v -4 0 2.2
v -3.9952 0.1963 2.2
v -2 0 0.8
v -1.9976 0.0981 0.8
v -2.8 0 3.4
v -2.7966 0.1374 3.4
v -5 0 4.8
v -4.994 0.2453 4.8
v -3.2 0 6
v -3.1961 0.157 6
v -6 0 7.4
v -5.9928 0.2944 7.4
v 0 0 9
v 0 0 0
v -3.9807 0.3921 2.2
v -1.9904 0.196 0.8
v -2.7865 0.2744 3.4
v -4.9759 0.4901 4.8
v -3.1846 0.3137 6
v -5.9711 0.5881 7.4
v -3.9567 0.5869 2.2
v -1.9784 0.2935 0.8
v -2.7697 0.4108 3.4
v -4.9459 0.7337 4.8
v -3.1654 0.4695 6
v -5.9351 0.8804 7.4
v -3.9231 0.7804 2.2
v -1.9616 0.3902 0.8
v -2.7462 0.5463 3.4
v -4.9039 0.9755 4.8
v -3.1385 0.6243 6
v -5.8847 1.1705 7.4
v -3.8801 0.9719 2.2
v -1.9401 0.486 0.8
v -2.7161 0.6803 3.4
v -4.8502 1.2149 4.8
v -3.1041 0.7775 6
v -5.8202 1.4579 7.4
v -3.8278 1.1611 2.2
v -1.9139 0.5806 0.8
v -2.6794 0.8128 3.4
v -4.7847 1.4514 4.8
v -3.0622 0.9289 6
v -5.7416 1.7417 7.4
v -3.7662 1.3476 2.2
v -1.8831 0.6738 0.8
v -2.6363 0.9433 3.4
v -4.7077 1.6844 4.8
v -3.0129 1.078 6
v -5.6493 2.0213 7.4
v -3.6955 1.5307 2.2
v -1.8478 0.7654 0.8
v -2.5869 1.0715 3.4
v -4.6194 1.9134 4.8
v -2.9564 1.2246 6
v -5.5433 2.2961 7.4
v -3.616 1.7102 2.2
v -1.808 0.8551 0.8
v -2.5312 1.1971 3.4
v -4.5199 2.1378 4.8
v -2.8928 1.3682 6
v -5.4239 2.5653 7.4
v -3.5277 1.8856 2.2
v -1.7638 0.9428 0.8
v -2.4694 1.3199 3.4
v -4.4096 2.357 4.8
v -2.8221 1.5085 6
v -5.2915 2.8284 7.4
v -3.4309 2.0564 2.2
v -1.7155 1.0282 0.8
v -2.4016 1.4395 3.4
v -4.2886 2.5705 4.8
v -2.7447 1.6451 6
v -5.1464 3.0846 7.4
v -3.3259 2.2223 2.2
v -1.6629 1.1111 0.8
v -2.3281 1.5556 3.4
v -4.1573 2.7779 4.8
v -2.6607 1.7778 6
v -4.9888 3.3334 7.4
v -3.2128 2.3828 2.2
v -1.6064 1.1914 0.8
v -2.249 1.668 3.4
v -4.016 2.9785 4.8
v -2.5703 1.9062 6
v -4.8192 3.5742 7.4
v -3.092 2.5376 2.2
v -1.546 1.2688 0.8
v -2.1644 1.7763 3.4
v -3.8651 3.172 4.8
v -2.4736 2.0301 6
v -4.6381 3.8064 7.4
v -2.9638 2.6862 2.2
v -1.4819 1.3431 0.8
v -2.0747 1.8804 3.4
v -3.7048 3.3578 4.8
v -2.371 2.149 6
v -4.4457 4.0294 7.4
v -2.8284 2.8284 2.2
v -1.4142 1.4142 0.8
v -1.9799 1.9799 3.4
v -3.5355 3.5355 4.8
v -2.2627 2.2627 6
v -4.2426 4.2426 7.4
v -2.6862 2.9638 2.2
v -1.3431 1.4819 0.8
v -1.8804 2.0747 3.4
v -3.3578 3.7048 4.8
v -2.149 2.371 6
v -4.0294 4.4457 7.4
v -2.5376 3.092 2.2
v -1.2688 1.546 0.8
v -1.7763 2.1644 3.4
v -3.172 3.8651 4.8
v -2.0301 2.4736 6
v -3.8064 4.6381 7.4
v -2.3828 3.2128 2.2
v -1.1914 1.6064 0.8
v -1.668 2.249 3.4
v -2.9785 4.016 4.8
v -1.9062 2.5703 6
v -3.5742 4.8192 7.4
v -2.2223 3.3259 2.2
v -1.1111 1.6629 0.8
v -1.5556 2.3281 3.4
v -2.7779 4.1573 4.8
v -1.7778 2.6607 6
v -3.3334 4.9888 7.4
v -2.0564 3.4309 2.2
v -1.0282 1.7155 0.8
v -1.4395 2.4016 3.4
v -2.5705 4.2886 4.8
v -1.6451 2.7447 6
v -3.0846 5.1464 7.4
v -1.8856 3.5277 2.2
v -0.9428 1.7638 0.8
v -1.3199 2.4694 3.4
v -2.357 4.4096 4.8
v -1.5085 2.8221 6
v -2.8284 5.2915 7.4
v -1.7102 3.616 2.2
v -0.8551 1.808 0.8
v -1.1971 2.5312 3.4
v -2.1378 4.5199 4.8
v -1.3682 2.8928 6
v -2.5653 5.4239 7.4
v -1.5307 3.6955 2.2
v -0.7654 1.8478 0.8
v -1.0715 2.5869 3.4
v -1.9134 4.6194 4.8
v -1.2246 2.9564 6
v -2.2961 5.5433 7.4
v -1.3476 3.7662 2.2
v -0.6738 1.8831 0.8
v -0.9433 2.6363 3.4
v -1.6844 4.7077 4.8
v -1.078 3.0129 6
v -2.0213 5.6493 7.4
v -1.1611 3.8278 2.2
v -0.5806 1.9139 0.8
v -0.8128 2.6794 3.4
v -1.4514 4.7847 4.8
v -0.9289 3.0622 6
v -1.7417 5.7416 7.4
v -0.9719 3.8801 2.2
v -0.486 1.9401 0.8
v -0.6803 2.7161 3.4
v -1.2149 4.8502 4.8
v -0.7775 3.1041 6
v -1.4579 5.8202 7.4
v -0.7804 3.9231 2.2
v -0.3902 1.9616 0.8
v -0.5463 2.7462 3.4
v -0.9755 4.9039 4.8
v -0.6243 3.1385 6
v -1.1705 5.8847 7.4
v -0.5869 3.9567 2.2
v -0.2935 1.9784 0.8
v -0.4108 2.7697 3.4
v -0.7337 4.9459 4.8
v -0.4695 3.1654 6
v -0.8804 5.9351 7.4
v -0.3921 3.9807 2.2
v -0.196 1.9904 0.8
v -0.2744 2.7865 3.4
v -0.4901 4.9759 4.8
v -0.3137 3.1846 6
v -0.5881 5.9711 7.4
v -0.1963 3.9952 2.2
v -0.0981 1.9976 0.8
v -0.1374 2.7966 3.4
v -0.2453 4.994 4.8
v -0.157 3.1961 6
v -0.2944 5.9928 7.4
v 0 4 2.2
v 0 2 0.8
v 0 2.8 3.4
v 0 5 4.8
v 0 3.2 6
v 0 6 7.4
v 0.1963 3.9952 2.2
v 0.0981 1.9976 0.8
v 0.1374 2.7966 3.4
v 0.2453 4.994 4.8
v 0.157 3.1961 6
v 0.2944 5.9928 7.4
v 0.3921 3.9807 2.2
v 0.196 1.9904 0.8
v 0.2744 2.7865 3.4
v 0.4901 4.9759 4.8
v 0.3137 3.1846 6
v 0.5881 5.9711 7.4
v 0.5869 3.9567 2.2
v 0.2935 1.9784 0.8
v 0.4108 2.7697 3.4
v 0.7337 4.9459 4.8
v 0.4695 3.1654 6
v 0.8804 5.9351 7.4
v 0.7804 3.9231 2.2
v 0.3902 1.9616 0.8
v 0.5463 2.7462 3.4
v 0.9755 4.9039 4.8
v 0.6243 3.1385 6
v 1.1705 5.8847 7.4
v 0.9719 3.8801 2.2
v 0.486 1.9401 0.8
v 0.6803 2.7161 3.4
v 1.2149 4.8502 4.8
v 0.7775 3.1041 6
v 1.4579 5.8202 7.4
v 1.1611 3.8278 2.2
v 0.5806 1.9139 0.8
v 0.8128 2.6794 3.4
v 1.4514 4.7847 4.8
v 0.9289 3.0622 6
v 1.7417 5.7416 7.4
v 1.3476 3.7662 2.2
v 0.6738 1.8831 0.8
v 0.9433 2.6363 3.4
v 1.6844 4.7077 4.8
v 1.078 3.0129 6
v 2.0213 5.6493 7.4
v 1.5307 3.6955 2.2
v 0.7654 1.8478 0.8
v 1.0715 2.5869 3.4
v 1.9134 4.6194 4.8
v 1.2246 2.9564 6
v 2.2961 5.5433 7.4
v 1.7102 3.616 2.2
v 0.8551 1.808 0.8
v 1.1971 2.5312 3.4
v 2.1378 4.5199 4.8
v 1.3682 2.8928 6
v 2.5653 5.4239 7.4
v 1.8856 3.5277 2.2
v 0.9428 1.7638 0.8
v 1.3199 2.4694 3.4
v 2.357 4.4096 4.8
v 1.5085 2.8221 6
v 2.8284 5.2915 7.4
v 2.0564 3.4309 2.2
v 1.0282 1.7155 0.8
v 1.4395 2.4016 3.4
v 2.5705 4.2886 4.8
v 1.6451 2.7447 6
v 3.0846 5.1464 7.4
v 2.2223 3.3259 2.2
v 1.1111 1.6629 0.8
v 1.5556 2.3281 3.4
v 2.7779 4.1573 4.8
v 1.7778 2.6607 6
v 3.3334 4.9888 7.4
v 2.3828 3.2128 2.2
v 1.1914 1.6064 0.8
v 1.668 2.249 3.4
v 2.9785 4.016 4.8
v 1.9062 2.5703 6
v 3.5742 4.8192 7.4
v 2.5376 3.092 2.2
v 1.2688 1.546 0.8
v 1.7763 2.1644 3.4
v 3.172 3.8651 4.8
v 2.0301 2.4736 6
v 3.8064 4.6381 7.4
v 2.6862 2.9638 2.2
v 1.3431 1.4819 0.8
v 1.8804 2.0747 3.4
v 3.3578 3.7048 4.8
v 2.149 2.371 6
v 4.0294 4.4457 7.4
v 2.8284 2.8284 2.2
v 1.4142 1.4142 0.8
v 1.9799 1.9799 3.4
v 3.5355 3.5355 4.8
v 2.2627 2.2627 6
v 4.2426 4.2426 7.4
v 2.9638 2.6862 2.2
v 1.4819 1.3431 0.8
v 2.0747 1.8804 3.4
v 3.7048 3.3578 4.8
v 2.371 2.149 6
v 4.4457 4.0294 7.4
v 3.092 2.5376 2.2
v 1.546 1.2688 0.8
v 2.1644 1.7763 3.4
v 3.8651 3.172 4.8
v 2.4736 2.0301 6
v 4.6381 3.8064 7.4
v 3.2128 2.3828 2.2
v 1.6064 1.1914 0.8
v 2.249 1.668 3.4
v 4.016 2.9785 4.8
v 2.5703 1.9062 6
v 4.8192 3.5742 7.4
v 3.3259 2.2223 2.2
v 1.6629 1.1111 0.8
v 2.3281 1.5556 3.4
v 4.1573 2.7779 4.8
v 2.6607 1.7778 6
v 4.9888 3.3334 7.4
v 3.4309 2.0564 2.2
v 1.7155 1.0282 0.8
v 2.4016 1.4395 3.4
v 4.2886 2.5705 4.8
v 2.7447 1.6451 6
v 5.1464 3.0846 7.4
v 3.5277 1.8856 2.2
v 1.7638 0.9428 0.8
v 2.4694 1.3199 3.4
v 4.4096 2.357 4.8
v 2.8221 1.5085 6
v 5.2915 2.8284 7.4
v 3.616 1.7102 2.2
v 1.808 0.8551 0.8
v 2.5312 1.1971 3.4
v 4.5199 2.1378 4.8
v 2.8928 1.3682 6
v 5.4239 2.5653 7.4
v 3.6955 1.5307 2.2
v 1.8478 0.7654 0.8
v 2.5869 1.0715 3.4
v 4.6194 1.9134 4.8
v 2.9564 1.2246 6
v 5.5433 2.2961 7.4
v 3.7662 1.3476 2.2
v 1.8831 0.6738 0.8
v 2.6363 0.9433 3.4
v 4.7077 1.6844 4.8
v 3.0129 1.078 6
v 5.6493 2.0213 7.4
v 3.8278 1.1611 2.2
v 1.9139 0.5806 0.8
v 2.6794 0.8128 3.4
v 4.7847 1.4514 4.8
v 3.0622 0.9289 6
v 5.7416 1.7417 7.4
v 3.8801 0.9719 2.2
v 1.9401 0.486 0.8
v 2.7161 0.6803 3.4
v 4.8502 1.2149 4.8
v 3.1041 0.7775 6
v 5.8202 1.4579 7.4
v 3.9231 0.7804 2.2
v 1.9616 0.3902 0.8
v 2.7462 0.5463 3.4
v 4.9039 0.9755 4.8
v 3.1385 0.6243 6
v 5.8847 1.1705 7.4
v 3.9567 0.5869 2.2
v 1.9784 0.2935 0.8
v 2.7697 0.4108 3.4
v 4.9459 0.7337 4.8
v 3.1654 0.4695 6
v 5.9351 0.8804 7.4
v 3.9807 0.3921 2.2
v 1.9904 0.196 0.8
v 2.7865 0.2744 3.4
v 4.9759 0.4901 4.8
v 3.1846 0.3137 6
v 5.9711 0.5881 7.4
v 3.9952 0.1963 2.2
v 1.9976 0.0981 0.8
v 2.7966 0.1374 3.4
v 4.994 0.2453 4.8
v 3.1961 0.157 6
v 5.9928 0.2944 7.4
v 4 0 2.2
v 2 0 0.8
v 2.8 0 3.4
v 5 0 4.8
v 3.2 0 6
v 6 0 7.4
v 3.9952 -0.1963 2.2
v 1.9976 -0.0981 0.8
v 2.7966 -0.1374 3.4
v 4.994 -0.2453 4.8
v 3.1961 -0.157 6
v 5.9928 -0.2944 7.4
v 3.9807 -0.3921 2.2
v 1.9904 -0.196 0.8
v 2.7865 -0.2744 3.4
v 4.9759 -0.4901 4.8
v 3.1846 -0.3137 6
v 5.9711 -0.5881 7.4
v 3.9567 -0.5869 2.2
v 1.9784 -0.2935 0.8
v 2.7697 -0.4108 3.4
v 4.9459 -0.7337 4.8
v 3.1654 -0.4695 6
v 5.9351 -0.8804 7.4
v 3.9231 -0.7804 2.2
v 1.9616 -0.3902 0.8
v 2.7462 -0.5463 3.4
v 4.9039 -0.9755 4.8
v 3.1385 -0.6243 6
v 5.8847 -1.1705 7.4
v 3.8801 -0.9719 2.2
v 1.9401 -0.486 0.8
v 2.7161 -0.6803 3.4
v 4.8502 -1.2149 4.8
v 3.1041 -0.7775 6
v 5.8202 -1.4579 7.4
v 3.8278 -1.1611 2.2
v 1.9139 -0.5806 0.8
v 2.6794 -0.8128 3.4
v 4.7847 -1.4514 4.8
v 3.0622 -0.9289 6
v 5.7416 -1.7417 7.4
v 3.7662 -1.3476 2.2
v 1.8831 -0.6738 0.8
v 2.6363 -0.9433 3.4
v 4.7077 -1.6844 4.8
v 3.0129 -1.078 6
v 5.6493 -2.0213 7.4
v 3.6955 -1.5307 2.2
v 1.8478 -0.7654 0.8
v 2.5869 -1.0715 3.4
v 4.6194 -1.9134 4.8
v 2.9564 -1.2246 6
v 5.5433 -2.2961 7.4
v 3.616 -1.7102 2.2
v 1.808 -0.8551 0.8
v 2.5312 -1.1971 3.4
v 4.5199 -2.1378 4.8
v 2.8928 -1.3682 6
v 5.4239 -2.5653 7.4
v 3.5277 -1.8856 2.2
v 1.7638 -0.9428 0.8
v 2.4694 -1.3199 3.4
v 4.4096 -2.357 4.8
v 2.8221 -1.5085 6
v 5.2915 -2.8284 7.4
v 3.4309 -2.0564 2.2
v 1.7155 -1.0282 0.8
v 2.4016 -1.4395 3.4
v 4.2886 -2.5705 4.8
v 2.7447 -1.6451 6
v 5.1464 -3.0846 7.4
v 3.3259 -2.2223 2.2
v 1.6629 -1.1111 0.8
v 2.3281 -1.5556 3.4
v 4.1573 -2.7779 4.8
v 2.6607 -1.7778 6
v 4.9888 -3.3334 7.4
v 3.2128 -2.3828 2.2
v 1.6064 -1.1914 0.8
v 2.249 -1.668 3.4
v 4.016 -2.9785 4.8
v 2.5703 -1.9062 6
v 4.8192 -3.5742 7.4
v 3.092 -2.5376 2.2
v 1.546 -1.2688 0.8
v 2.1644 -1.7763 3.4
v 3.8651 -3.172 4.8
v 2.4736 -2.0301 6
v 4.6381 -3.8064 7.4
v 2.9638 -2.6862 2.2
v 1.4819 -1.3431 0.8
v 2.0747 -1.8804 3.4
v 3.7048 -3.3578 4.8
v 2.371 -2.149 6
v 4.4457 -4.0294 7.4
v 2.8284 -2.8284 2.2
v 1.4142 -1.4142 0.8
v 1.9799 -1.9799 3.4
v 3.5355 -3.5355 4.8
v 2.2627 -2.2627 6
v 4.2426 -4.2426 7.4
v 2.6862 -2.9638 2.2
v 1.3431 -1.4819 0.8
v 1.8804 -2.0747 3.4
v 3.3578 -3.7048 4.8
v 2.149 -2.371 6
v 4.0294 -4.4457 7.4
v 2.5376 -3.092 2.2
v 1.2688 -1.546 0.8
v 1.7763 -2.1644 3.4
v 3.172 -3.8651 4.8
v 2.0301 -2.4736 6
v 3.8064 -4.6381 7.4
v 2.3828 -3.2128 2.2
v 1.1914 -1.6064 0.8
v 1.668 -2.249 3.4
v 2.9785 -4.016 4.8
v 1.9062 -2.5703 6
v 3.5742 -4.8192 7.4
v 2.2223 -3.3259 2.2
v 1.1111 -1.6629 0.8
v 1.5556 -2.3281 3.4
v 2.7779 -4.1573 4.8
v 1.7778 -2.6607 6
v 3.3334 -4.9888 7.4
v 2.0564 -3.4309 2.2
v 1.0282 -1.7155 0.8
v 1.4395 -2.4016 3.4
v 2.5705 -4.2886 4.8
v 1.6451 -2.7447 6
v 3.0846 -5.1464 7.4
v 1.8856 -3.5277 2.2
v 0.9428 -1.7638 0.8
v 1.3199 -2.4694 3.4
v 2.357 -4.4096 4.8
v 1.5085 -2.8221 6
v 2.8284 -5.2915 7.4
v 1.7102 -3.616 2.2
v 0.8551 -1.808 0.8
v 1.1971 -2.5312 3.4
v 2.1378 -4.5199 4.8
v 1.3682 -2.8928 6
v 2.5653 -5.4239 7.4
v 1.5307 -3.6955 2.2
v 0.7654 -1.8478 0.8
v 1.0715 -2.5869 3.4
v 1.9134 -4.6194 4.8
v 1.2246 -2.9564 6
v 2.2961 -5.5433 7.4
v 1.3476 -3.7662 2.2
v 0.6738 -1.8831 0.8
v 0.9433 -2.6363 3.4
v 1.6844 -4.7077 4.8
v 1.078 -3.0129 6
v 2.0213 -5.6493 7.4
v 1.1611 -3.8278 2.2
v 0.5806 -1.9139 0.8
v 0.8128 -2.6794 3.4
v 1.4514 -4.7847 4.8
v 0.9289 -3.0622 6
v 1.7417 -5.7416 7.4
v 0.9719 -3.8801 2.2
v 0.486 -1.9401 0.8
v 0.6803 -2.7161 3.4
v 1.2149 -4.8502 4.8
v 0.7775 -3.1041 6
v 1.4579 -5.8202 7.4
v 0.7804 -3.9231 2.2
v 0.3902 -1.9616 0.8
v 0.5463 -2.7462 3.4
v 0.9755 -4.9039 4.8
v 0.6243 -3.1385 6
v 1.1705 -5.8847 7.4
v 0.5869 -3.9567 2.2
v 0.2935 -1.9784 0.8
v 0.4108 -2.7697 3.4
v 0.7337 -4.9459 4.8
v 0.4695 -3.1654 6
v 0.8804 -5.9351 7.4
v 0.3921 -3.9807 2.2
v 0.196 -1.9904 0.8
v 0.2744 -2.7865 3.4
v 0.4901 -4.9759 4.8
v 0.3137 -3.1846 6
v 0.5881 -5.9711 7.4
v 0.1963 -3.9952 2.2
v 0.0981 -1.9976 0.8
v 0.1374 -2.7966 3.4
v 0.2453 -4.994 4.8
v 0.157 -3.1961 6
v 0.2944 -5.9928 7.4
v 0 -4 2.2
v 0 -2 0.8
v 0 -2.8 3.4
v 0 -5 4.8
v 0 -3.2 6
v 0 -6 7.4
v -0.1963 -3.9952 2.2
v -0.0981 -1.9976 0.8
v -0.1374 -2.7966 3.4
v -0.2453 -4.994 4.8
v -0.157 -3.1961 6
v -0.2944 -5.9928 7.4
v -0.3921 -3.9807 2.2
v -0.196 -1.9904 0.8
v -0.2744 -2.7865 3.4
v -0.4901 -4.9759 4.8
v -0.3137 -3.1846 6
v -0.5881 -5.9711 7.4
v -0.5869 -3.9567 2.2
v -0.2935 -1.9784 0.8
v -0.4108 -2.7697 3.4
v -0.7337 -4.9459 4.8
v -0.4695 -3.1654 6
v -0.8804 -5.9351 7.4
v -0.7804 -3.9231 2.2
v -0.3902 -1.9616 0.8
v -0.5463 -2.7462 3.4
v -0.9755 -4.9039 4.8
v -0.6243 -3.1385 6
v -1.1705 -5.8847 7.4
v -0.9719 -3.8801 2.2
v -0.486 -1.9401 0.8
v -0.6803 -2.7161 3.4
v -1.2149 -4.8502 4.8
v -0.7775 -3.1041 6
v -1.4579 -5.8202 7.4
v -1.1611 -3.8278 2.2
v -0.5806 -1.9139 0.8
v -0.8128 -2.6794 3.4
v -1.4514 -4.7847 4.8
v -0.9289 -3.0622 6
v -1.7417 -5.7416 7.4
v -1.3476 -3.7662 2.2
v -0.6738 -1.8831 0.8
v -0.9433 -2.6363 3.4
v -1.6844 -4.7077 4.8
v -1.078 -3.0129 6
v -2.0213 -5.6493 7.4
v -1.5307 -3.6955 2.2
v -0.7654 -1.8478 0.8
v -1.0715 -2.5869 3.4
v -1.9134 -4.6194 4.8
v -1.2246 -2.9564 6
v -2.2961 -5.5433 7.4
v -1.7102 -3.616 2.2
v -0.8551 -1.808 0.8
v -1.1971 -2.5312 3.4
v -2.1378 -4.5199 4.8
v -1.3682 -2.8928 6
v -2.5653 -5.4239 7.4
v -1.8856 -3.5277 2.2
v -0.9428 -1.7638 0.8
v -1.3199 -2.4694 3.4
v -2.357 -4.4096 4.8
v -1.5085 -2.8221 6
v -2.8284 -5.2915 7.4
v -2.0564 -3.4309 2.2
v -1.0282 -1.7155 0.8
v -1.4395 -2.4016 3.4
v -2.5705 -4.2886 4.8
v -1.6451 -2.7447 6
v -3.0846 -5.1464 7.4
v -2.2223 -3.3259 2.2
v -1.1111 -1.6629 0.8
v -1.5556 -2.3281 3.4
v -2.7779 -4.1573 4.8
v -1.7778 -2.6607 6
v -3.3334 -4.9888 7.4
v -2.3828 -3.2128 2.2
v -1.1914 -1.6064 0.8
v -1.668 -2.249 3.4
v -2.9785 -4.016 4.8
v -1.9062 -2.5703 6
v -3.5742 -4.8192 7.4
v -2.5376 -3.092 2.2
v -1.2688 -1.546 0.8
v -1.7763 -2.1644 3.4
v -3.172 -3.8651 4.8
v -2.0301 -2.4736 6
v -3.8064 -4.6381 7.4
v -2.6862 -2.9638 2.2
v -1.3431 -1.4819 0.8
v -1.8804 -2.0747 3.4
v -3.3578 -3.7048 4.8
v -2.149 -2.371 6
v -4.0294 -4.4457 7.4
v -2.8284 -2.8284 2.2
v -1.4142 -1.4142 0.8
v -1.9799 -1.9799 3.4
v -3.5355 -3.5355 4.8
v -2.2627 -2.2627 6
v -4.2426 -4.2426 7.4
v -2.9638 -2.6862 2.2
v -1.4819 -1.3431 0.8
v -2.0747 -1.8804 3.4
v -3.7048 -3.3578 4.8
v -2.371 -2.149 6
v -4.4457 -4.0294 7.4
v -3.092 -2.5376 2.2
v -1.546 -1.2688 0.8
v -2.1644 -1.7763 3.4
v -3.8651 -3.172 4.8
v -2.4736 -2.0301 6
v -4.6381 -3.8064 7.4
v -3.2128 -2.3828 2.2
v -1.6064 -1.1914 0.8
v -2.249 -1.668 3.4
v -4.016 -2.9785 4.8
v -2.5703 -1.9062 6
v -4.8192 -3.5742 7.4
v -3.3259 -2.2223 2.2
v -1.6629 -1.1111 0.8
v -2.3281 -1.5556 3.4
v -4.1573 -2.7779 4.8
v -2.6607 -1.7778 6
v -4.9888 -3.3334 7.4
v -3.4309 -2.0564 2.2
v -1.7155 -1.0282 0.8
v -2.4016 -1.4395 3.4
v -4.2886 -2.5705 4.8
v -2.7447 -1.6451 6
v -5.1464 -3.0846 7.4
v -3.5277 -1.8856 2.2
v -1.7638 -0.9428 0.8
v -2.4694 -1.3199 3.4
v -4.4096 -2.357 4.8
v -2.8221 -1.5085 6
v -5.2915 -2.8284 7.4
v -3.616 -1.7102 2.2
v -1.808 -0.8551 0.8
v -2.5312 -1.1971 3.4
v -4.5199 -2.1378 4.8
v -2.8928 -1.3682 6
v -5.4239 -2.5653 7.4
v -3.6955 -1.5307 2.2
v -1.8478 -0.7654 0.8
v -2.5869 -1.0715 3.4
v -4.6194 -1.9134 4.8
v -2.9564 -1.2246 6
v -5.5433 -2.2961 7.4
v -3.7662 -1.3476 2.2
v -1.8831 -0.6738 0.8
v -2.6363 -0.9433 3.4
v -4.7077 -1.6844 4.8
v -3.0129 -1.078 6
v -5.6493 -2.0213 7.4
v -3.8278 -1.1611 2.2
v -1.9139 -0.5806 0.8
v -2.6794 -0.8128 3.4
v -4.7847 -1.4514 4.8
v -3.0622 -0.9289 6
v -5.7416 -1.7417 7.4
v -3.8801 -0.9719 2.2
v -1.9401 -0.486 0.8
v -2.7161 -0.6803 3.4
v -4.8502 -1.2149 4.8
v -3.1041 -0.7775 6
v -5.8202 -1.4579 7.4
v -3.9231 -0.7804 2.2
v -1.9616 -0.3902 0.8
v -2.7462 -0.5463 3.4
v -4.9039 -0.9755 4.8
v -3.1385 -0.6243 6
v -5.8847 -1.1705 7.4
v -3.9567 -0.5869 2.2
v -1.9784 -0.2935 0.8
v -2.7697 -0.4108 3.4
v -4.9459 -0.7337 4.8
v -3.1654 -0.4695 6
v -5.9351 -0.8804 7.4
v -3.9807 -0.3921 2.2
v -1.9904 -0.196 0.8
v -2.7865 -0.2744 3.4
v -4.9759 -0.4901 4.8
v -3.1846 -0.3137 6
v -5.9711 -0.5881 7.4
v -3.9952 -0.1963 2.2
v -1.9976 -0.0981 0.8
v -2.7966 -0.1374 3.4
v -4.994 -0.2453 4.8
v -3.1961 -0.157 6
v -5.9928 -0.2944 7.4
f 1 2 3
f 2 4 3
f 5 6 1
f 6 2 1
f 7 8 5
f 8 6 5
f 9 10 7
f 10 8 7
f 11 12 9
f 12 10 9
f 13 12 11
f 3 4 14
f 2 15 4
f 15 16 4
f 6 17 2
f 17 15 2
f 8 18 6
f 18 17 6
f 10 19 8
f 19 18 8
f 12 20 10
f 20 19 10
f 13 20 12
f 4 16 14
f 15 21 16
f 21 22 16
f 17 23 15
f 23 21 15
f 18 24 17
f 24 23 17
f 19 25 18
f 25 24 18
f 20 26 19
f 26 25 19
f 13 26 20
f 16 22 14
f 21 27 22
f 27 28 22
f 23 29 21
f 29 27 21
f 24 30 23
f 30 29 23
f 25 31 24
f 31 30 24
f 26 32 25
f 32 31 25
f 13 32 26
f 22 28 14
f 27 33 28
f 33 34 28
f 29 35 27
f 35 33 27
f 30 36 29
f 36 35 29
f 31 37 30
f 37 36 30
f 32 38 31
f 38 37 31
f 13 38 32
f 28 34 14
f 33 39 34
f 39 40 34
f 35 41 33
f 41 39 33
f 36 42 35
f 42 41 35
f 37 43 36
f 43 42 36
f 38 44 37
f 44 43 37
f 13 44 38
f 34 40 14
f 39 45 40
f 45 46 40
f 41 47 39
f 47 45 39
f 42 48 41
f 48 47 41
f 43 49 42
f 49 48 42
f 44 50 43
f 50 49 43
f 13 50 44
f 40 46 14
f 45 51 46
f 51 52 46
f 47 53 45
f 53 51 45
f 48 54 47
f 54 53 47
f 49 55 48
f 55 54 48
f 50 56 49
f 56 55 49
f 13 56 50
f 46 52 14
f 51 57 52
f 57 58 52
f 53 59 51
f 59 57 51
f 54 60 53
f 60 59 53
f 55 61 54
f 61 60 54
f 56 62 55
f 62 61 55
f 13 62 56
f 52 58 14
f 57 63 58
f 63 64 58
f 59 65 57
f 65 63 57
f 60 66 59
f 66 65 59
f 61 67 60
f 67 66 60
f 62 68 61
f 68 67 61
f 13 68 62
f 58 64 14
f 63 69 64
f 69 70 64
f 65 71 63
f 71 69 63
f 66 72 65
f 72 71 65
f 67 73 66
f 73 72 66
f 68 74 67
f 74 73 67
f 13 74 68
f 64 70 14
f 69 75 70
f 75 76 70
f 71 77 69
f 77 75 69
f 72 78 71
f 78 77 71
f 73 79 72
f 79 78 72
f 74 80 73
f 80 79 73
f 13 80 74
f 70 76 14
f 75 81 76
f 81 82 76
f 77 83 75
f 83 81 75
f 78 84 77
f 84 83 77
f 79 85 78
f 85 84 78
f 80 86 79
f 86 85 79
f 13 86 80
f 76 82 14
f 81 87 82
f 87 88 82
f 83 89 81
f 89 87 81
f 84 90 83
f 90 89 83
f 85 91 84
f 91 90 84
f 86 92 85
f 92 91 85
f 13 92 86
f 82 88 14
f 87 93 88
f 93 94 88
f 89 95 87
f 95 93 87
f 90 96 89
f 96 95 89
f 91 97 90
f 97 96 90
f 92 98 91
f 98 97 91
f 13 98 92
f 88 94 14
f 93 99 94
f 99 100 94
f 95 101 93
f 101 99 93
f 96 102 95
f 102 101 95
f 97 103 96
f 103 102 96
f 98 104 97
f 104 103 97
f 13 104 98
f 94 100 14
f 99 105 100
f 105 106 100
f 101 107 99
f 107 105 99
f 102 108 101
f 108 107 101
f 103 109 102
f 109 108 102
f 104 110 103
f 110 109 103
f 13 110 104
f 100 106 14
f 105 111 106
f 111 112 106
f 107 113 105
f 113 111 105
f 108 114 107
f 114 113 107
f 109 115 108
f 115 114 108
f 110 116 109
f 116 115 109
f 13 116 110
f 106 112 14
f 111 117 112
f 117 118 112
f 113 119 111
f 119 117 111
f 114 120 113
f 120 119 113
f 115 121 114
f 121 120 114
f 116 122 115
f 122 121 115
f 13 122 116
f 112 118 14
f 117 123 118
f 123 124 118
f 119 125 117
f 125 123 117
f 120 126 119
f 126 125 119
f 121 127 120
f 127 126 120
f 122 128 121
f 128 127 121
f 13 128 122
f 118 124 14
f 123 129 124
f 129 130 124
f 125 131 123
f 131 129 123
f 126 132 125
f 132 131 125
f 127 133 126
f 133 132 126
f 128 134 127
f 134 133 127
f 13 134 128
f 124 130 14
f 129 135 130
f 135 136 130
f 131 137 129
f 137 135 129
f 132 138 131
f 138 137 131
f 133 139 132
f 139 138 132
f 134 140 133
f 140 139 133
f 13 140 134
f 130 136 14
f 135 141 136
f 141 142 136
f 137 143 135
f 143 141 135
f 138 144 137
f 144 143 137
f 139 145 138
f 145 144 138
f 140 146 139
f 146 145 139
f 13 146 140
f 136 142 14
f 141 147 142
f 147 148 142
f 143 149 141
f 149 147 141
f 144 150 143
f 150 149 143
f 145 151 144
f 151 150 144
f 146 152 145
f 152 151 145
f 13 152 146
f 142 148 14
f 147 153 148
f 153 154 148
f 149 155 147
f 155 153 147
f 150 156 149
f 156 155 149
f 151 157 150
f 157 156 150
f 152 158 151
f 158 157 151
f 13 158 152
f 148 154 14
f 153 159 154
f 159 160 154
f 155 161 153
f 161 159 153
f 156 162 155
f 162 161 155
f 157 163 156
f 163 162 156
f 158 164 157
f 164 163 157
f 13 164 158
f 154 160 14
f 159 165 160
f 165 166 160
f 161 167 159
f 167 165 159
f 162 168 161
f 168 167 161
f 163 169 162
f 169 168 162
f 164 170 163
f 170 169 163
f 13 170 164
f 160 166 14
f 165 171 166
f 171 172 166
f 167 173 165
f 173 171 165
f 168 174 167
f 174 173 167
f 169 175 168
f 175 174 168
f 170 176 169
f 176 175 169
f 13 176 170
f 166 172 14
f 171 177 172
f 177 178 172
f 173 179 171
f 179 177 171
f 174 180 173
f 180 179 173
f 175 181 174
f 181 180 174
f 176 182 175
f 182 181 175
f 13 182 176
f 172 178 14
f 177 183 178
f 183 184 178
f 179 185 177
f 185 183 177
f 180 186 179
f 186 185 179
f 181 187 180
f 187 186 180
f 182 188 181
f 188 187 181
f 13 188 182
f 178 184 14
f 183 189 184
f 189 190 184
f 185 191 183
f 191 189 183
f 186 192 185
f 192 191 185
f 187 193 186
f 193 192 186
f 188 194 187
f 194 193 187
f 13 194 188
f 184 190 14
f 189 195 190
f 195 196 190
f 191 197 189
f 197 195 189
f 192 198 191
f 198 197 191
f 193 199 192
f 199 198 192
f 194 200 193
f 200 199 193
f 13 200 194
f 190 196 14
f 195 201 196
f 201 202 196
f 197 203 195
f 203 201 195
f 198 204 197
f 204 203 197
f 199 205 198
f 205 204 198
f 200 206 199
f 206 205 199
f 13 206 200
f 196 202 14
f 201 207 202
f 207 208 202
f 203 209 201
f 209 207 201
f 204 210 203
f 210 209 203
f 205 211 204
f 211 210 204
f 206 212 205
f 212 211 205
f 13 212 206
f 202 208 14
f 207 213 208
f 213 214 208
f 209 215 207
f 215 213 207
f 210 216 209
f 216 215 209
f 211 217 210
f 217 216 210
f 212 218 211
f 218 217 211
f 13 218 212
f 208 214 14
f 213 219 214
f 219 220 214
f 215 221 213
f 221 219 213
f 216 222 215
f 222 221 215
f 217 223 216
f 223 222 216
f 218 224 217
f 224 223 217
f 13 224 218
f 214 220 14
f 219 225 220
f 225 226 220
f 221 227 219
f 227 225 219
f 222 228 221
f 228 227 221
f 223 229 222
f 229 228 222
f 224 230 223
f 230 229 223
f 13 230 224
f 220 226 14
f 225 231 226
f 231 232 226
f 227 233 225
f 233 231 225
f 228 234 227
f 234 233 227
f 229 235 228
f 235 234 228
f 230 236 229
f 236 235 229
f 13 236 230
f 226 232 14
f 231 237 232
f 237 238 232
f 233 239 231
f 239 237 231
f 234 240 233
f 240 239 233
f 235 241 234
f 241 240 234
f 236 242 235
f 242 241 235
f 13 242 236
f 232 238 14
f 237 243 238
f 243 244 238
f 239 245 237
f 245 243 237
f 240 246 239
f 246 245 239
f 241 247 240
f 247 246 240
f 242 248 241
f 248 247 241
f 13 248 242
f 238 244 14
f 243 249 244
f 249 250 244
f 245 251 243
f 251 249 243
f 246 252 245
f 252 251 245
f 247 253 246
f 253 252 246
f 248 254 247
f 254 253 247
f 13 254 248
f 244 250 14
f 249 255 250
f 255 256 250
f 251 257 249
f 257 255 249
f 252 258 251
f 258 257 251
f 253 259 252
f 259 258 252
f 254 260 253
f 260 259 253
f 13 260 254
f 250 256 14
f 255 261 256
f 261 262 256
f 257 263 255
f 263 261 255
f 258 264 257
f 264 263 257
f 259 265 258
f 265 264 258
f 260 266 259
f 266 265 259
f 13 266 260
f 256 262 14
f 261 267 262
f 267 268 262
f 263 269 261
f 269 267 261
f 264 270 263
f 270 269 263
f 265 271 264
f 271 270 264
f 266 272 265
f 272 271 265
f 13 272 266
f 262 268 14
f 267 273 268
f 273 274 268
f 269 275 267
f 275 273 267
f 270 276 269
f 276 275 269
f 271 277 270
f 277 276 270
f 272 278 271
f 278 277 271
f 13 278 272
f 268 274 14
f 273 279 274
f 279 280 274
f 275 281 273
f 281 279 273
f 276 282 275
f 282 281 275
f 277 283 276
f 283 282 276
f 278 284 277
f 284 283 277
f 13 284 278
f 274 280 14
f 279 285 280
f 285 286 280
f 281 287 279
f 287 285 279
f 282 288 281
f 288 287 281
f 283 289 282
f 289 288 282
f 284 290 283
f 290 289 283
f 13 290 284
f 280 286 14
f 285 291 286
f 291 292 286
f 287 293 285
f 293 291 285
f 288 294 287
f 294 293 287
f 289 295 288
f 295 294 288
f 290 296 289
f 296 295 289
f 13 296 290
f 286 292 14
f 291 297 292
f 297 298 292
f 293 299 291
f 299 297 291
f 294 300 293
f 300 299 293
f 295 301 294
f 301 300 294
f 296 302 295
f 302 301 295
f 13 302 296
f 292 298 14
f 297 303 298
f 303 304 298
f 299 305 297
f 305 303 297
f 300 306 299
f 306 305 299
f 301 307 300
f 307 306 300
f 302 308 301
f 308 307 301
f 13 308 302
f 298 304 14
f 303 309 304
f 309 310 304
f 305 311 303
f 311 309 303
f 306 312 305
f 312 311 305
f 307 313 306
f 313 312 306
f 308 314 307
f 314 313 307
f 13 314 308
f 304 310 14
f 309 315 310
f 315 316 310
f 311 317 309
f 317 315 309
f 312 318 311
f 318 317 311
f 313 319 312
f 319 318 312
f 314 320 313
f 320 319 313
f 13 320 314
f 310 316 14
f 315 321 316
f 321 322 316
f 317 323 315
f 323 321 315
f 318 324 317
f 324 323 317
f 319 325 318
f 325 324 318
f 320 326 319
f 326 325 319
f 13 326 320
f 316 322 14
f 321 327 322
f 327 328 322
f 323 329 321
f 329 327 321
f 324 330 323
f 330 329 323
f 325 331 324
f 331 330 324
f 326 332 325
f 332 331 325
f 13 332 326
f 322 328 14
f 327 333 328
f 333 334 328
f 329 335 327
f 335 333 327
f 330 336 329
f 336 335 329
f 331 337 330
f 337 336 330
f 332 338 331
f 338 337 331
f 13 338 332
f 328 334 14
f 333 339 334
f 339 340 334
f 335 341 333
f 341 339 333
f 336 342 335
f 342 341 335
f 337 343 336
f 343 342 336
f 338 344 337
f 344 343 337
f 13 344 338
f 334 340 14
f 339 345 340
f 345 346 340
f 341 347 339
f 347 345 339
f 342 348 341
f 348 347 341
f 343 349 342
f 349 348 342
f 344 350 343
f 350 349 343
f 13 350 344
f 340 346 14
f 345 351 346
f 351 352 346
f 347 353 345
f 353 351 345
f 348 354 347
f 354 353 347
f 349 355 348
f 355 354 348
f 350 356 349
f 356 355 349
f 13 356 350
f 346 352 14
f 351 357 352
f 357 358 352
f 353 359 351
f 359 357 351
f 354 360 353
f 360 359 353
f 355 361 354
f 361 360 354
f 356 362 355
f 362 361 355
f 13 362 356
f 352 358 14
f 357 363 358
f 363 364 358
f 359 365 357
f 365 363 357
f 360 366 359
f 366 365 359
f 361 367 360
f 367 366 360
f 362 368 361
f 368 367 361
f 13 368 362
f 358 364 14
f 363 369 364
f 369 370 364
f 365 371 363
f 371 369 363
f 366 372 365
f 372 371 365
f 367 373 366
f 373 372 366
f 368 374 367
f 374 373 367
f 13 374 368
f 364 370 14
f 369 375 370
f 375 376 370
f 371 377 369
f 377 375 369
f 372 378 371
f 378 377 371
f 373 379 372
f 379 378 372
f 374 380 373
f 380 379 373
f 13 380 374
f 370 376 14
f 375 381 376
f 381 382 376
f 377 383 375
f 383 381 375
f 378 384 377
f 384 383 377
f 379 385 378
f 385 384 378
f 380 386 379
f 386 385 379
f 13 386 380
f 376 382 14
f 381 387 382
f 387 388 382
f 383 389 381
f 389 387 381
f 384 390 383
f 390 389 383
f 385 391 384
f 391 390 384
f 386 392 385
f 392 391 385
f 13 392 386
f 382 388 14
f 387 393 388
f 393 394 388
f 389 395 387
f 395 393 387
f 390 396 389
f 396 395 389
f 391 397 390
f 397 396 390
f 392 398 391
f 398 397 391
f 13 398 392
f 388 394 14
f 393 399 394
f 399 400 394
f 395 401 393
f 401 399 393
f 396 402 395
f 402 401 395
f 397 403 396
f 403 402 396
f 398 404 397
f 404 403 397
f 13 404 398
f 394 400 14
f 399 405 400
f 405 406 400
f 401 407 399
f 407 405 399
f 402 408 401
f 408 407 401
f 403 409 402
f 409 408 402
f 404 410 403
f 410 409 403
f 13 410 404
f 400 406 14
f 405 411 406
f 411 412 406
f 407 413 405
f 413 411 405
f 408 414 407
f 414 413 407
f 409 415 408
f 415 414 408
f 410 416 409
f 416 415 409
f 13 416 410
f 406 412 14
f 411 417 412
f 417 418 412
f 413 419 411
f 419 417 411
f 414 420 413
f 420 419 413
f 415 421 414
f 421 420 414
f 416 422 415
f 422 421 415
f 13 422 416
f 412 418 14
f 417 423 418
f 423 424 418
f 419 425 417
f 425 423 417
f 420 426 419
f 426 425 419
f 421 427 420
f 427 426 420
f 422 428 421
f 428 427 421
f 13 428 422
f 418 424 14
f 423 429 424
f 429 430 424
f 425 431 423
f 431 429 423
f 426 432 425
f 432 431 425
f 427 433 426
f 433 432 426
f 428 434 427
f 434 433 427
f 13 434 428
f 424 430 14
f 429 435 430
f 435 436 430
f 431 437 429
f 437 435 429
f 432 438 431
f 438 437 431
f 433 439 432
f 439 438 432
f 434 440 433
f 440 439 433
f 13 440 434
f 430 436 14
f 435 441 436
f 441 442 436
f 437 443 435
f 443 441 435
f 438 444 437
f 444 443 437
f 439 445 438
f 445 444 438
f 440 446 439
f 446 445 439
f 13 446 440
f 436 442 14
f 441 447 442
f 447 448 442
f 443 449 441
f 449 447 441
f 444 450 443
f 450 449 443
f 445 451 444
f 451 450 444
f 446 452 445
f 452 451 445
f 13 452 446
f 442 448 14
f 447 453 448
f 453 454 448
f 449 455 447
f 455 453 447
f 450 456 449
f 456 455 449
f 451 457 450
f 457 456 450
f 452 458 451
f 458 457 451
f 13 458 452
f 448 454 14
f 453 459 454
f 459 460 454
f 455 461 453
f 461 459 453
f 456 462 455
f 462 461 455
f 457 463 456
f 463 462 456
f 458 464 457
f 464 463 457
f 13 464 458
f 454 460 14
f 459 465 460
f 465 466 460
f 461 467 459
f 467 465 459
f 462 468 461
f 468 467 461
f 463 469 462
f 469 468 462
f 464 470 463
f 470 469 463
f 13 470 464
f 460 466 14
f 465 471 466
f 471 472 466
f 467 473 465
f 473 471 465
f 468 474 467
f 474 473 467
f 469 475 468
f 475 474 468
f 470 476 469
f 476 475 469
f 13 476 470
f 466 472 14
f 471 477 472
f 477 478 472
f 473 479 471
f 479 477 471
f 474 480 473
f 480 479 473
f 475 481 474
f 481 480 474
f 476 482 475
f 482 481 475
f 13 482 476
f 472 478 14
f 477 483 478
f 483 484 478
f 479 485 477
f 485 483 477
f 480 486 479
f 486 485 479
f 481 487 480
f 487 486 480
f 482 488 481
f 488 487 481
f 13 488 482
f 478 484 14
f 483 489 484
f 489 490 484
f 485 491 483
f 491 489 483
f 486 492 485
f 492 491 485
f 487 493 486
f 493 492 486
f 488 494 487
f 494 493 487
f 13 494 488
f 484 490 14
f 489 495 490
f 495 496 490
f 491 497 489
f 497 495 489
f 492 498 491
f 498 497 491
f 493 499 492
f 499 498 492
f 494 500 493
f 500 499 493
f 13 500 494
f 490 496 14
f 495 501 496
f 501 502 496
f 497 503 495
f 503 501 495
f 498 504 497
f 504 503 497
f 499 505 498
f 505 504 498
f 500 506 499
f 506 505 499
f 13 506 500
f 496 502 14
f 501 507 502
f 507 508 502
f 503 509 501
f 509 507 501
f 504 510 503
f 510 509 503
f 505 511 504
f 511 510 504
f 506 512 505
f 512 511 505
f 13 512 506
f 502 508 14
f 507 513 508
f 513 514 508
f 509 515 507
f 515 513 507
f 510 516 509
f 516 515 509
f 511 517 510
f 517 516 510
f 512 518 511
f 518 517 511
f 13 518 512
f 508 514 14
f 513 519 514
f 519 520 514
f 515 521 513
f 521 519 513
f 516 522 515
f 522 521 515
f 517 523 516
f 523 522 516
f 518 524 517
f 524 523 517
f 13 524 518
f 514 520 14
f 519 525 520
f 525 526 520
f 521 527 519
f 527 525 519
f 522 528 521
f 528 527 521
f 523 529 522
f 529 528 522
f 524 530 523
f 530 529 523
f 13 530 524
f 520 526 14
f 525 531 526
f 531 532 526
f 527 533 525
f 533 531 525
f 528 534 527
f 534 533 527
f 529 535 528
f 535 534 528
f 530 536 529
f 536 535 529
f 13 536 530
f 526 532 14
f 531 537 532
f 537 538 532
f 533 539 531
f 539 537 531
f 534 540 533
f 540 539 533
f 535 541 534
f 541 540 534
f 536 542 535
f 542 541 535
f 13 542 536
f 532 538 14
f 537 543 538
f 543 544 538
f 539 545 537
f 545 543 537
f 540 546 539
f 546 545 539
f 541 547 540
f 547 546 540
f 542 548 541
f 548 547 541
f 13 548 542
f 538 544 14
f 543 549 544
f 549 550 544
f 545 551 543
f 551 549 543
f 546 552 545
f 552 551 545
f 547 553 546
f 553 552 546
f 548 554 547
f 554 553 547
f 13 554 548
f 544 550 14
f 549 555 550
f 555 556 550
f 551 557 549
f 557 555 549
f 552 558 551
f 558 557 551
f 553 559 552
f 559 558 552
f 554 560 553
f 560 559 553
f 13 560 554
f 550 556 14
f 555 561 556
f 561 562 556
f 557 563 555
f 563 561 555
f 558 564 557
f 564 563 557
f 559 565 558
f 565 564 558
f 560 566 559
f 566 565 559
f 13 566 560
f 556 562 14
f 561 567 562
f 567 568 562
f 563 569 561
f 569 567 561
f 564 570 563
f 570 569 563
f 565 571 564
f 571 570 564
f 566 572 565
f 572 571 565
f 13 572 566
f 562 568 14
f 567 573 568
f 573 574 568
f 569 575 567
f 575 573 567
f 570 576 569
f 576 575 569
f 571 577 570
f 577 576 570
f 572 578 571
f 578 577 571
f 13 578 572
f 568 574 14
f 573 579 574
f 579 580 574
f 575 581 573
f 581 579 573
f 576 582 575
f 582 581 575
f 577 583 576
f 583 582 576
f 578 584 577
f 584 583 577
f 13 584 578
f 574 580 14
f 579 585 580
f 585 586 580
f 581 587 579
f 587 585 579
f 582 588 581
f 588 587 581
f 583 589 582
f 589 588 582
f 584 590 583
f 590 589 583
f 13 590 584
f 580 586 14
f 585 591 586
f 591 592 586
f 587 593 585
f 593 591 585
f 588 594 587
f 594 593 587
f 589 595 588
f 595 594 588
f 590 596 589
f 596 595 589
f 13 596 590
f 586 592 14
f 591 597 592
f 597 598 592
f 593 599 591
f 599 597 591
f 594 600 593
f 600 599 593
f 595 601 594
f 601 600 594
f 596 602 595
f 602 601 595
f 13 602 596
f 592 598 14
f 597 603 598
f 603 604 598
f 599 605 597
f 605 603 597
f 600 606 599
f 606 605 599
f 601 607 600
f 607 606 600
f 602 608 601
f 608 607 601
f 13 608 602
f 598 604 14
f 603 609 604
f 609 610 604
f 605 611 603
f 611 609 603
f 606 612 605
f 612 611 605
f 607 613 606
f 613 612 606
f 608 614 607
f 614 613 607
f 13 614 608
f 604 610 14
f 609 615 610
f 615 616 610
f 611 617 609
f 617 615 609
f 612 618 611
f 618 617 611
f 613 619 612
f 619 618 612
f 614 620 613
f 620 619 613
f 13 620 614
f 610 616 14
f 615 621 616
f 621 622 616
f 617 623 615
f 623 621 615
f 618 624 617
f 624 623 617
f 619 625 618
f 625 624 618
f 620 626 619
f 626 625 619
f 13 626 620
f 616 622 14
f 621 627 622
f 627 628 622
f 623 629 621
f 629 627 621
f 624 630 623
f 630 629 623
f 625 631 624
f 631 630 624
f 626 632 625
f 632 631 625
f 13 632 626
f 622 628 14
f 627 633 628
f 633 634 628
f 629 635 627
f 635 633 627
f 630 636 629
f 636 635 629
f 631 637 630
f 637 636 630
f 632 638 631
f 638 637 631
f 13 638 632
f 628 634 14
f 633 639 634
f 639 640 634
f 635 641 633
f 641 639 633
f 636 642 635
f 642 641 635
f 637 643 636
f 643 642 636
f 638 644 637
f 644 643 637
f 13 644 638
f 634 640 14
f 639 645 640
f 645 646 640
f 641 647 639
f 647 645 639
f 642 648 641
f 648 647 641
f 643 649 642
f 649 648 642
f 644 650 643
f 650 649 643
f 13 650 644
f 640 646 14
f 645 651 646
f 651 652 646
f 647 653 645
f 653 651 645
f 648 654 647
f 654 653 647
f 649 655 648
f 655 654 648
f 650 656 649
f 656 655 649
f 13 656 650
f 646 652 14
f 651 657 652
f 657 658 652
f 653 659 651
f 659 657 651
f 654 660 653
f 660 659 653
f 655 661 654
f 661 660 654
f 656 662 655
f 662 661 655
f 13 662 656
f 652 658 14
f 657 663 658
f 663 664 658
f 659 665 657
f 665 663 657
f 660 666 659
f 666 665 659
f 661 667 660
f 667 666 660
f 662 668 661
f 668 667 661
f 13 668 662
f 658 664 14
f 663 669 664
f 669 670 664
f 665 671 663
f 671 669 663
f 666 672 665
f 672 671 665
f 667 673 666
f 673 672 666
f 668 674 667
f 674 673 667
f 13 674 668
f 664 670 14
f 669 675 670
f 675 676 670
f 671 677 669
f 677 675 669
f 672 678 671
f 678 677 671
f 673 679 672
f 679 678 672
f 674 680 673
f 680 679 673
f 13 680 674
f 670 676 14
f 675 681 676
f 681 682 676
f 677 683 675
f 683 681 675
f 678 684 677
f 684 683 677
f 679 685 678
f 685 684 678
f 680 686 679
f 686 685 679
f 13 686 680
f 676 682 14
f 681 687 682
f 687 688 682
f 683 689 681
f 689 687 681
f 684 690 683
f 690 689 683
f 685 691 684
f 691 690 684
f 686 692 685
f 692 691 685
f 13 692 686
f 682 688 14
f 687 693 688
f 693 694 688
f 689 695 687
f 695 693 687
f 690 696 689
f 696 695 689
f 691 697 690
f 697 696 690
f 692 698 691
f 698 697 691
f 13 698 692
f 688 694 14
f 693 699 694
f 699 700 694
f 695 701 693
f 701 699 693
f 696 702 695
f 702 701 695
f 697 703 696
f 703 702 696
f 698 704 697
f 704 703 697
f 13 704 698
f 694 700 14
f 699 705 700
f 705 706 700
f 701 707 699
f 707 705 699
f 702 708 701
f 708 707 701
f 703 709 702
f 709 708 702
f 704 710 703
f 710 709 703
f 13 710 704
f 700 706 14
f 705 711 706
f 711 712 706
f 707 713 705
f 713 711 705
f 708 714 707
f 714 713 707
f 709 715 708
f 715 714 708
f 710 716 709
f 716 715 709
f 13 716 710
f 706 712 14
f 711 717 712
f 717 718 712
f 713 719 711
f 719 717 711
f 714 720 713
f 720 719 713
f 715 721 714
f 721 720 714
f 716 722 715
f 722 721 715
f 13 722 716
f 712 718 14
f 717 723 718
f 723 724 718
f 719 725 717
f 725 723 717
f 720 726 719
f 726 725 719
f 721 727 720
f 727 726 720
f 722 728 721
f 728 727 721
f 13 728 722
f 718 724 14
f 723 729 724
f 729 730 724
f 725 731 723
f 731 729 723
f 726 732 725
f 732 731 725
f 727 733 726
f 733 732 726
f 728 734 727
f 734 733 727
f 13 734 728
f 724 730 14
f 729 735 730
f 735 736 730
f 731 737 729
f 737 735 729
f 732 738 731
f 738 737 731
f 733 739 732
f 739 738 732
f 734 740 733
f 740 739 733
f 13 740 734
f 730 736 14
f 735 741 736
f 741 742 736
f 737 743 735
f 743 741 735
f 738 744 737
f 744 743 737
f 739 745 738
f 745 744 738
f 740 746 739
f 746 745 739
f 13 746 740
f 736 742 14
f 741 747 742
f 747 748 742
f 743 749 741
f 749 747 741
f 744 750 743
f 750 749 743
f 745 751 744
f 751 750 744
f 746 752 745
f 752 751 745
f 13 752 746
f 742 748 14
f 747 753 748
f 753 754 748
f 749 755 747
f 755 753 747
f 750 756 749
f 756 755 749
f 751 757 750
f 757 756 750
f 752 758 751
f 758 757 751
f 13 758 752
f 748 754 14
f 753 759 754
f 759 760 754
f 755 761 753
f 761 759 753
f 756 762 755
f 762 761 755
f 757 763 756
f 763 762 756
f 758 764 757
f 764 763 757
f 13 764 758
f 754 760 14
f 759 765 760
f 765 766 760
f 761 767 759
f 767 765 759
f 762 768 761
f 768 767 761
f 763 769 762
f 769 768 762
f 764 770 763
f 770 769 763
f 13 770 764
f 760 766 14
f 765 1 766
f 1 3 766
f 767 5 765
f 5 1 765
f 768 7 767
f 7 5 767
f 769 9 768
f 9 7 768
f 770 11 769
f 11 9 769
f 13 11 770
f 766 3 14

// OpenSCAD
// Auto-generated from tests/data/feature_fixtures_manifest.json
// fixture: revolve_christmas_tree
// fixture_type: revolve
// description: Sawtooth tree profile that should emit one compact rotate_extrude polygon.
$fn = 96;

profile = [
    [0.000000, 0.000000],
    [2.000000, 0.800000],
    [4.000000, 2.200000],
    [2.800000, 3.400000],
    [5.000000, 4.800000],
    [3.200000, 6.000000],
    [6.000000, 7.400000],
    [0.000000, 9.000000]
];

rotate_extrude($fn=128) polygon(points=profile);
